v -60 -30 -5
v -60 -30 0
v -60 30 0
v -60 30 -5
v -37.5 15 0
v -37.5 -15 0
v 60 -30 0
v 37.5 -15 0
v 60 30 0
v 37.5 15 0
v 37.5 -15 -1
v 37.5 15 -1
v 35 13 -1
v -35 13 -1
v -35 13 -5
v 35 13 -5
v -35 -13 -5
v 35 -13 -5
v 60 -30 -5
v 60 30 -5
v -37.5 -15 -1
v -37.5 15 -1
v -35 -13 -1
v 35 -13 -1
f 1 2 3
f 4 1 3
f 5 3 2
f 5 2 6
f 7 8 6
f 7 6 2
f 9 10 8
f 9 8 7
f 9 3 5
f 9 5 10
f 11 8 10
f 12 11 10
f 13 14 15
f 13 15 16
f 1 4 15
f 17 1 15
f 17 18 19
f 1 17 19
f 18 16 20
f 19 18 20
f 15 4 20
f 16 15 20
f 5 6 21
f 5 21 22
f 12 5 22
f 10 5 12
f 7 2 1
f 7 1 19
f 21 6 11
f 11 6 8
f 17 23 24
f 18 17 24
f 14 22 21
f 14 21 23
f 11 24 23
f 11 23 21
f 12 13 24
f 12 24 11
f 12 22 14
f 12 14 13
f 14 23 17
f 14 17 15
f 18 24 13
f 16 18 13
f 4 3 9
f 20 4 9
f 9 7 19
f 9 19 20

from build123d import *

# Parameters (mm, degrees)
F0_W     = 120
F0_H     = 60
F3_DEPTH = 5
F1_W     = 75
F1_H     = 30
F4_DEPTH = 1
F2_W     = 70
F2_H     = 26
F5_DEPTH = 10


with BuildPart() as f3:
    # F0 (on Top) → F3 (new body)
    with BuildSketch(Plane.XY):
        Rectangle(F0_W, F0_H)
    extrude(amount=-F3_DEPTH)

    # F1 (on Top) → F4 (cut)
    with BuildSketch(Plane.XY):
        Rectangle(F1_W, F1_H)
    extrude(amount=-F4_DEPTH, mode=Mode.SUBTRACT)

    # F2 (on Top) → F5 (cut)
    with BuildSketch(Plane.XY):
        Rectangle(F2_W, F2_H)
    extrude(amount=-F5_DEPTH, mode=Mode.SUBTRACT)


solid = f3.part
